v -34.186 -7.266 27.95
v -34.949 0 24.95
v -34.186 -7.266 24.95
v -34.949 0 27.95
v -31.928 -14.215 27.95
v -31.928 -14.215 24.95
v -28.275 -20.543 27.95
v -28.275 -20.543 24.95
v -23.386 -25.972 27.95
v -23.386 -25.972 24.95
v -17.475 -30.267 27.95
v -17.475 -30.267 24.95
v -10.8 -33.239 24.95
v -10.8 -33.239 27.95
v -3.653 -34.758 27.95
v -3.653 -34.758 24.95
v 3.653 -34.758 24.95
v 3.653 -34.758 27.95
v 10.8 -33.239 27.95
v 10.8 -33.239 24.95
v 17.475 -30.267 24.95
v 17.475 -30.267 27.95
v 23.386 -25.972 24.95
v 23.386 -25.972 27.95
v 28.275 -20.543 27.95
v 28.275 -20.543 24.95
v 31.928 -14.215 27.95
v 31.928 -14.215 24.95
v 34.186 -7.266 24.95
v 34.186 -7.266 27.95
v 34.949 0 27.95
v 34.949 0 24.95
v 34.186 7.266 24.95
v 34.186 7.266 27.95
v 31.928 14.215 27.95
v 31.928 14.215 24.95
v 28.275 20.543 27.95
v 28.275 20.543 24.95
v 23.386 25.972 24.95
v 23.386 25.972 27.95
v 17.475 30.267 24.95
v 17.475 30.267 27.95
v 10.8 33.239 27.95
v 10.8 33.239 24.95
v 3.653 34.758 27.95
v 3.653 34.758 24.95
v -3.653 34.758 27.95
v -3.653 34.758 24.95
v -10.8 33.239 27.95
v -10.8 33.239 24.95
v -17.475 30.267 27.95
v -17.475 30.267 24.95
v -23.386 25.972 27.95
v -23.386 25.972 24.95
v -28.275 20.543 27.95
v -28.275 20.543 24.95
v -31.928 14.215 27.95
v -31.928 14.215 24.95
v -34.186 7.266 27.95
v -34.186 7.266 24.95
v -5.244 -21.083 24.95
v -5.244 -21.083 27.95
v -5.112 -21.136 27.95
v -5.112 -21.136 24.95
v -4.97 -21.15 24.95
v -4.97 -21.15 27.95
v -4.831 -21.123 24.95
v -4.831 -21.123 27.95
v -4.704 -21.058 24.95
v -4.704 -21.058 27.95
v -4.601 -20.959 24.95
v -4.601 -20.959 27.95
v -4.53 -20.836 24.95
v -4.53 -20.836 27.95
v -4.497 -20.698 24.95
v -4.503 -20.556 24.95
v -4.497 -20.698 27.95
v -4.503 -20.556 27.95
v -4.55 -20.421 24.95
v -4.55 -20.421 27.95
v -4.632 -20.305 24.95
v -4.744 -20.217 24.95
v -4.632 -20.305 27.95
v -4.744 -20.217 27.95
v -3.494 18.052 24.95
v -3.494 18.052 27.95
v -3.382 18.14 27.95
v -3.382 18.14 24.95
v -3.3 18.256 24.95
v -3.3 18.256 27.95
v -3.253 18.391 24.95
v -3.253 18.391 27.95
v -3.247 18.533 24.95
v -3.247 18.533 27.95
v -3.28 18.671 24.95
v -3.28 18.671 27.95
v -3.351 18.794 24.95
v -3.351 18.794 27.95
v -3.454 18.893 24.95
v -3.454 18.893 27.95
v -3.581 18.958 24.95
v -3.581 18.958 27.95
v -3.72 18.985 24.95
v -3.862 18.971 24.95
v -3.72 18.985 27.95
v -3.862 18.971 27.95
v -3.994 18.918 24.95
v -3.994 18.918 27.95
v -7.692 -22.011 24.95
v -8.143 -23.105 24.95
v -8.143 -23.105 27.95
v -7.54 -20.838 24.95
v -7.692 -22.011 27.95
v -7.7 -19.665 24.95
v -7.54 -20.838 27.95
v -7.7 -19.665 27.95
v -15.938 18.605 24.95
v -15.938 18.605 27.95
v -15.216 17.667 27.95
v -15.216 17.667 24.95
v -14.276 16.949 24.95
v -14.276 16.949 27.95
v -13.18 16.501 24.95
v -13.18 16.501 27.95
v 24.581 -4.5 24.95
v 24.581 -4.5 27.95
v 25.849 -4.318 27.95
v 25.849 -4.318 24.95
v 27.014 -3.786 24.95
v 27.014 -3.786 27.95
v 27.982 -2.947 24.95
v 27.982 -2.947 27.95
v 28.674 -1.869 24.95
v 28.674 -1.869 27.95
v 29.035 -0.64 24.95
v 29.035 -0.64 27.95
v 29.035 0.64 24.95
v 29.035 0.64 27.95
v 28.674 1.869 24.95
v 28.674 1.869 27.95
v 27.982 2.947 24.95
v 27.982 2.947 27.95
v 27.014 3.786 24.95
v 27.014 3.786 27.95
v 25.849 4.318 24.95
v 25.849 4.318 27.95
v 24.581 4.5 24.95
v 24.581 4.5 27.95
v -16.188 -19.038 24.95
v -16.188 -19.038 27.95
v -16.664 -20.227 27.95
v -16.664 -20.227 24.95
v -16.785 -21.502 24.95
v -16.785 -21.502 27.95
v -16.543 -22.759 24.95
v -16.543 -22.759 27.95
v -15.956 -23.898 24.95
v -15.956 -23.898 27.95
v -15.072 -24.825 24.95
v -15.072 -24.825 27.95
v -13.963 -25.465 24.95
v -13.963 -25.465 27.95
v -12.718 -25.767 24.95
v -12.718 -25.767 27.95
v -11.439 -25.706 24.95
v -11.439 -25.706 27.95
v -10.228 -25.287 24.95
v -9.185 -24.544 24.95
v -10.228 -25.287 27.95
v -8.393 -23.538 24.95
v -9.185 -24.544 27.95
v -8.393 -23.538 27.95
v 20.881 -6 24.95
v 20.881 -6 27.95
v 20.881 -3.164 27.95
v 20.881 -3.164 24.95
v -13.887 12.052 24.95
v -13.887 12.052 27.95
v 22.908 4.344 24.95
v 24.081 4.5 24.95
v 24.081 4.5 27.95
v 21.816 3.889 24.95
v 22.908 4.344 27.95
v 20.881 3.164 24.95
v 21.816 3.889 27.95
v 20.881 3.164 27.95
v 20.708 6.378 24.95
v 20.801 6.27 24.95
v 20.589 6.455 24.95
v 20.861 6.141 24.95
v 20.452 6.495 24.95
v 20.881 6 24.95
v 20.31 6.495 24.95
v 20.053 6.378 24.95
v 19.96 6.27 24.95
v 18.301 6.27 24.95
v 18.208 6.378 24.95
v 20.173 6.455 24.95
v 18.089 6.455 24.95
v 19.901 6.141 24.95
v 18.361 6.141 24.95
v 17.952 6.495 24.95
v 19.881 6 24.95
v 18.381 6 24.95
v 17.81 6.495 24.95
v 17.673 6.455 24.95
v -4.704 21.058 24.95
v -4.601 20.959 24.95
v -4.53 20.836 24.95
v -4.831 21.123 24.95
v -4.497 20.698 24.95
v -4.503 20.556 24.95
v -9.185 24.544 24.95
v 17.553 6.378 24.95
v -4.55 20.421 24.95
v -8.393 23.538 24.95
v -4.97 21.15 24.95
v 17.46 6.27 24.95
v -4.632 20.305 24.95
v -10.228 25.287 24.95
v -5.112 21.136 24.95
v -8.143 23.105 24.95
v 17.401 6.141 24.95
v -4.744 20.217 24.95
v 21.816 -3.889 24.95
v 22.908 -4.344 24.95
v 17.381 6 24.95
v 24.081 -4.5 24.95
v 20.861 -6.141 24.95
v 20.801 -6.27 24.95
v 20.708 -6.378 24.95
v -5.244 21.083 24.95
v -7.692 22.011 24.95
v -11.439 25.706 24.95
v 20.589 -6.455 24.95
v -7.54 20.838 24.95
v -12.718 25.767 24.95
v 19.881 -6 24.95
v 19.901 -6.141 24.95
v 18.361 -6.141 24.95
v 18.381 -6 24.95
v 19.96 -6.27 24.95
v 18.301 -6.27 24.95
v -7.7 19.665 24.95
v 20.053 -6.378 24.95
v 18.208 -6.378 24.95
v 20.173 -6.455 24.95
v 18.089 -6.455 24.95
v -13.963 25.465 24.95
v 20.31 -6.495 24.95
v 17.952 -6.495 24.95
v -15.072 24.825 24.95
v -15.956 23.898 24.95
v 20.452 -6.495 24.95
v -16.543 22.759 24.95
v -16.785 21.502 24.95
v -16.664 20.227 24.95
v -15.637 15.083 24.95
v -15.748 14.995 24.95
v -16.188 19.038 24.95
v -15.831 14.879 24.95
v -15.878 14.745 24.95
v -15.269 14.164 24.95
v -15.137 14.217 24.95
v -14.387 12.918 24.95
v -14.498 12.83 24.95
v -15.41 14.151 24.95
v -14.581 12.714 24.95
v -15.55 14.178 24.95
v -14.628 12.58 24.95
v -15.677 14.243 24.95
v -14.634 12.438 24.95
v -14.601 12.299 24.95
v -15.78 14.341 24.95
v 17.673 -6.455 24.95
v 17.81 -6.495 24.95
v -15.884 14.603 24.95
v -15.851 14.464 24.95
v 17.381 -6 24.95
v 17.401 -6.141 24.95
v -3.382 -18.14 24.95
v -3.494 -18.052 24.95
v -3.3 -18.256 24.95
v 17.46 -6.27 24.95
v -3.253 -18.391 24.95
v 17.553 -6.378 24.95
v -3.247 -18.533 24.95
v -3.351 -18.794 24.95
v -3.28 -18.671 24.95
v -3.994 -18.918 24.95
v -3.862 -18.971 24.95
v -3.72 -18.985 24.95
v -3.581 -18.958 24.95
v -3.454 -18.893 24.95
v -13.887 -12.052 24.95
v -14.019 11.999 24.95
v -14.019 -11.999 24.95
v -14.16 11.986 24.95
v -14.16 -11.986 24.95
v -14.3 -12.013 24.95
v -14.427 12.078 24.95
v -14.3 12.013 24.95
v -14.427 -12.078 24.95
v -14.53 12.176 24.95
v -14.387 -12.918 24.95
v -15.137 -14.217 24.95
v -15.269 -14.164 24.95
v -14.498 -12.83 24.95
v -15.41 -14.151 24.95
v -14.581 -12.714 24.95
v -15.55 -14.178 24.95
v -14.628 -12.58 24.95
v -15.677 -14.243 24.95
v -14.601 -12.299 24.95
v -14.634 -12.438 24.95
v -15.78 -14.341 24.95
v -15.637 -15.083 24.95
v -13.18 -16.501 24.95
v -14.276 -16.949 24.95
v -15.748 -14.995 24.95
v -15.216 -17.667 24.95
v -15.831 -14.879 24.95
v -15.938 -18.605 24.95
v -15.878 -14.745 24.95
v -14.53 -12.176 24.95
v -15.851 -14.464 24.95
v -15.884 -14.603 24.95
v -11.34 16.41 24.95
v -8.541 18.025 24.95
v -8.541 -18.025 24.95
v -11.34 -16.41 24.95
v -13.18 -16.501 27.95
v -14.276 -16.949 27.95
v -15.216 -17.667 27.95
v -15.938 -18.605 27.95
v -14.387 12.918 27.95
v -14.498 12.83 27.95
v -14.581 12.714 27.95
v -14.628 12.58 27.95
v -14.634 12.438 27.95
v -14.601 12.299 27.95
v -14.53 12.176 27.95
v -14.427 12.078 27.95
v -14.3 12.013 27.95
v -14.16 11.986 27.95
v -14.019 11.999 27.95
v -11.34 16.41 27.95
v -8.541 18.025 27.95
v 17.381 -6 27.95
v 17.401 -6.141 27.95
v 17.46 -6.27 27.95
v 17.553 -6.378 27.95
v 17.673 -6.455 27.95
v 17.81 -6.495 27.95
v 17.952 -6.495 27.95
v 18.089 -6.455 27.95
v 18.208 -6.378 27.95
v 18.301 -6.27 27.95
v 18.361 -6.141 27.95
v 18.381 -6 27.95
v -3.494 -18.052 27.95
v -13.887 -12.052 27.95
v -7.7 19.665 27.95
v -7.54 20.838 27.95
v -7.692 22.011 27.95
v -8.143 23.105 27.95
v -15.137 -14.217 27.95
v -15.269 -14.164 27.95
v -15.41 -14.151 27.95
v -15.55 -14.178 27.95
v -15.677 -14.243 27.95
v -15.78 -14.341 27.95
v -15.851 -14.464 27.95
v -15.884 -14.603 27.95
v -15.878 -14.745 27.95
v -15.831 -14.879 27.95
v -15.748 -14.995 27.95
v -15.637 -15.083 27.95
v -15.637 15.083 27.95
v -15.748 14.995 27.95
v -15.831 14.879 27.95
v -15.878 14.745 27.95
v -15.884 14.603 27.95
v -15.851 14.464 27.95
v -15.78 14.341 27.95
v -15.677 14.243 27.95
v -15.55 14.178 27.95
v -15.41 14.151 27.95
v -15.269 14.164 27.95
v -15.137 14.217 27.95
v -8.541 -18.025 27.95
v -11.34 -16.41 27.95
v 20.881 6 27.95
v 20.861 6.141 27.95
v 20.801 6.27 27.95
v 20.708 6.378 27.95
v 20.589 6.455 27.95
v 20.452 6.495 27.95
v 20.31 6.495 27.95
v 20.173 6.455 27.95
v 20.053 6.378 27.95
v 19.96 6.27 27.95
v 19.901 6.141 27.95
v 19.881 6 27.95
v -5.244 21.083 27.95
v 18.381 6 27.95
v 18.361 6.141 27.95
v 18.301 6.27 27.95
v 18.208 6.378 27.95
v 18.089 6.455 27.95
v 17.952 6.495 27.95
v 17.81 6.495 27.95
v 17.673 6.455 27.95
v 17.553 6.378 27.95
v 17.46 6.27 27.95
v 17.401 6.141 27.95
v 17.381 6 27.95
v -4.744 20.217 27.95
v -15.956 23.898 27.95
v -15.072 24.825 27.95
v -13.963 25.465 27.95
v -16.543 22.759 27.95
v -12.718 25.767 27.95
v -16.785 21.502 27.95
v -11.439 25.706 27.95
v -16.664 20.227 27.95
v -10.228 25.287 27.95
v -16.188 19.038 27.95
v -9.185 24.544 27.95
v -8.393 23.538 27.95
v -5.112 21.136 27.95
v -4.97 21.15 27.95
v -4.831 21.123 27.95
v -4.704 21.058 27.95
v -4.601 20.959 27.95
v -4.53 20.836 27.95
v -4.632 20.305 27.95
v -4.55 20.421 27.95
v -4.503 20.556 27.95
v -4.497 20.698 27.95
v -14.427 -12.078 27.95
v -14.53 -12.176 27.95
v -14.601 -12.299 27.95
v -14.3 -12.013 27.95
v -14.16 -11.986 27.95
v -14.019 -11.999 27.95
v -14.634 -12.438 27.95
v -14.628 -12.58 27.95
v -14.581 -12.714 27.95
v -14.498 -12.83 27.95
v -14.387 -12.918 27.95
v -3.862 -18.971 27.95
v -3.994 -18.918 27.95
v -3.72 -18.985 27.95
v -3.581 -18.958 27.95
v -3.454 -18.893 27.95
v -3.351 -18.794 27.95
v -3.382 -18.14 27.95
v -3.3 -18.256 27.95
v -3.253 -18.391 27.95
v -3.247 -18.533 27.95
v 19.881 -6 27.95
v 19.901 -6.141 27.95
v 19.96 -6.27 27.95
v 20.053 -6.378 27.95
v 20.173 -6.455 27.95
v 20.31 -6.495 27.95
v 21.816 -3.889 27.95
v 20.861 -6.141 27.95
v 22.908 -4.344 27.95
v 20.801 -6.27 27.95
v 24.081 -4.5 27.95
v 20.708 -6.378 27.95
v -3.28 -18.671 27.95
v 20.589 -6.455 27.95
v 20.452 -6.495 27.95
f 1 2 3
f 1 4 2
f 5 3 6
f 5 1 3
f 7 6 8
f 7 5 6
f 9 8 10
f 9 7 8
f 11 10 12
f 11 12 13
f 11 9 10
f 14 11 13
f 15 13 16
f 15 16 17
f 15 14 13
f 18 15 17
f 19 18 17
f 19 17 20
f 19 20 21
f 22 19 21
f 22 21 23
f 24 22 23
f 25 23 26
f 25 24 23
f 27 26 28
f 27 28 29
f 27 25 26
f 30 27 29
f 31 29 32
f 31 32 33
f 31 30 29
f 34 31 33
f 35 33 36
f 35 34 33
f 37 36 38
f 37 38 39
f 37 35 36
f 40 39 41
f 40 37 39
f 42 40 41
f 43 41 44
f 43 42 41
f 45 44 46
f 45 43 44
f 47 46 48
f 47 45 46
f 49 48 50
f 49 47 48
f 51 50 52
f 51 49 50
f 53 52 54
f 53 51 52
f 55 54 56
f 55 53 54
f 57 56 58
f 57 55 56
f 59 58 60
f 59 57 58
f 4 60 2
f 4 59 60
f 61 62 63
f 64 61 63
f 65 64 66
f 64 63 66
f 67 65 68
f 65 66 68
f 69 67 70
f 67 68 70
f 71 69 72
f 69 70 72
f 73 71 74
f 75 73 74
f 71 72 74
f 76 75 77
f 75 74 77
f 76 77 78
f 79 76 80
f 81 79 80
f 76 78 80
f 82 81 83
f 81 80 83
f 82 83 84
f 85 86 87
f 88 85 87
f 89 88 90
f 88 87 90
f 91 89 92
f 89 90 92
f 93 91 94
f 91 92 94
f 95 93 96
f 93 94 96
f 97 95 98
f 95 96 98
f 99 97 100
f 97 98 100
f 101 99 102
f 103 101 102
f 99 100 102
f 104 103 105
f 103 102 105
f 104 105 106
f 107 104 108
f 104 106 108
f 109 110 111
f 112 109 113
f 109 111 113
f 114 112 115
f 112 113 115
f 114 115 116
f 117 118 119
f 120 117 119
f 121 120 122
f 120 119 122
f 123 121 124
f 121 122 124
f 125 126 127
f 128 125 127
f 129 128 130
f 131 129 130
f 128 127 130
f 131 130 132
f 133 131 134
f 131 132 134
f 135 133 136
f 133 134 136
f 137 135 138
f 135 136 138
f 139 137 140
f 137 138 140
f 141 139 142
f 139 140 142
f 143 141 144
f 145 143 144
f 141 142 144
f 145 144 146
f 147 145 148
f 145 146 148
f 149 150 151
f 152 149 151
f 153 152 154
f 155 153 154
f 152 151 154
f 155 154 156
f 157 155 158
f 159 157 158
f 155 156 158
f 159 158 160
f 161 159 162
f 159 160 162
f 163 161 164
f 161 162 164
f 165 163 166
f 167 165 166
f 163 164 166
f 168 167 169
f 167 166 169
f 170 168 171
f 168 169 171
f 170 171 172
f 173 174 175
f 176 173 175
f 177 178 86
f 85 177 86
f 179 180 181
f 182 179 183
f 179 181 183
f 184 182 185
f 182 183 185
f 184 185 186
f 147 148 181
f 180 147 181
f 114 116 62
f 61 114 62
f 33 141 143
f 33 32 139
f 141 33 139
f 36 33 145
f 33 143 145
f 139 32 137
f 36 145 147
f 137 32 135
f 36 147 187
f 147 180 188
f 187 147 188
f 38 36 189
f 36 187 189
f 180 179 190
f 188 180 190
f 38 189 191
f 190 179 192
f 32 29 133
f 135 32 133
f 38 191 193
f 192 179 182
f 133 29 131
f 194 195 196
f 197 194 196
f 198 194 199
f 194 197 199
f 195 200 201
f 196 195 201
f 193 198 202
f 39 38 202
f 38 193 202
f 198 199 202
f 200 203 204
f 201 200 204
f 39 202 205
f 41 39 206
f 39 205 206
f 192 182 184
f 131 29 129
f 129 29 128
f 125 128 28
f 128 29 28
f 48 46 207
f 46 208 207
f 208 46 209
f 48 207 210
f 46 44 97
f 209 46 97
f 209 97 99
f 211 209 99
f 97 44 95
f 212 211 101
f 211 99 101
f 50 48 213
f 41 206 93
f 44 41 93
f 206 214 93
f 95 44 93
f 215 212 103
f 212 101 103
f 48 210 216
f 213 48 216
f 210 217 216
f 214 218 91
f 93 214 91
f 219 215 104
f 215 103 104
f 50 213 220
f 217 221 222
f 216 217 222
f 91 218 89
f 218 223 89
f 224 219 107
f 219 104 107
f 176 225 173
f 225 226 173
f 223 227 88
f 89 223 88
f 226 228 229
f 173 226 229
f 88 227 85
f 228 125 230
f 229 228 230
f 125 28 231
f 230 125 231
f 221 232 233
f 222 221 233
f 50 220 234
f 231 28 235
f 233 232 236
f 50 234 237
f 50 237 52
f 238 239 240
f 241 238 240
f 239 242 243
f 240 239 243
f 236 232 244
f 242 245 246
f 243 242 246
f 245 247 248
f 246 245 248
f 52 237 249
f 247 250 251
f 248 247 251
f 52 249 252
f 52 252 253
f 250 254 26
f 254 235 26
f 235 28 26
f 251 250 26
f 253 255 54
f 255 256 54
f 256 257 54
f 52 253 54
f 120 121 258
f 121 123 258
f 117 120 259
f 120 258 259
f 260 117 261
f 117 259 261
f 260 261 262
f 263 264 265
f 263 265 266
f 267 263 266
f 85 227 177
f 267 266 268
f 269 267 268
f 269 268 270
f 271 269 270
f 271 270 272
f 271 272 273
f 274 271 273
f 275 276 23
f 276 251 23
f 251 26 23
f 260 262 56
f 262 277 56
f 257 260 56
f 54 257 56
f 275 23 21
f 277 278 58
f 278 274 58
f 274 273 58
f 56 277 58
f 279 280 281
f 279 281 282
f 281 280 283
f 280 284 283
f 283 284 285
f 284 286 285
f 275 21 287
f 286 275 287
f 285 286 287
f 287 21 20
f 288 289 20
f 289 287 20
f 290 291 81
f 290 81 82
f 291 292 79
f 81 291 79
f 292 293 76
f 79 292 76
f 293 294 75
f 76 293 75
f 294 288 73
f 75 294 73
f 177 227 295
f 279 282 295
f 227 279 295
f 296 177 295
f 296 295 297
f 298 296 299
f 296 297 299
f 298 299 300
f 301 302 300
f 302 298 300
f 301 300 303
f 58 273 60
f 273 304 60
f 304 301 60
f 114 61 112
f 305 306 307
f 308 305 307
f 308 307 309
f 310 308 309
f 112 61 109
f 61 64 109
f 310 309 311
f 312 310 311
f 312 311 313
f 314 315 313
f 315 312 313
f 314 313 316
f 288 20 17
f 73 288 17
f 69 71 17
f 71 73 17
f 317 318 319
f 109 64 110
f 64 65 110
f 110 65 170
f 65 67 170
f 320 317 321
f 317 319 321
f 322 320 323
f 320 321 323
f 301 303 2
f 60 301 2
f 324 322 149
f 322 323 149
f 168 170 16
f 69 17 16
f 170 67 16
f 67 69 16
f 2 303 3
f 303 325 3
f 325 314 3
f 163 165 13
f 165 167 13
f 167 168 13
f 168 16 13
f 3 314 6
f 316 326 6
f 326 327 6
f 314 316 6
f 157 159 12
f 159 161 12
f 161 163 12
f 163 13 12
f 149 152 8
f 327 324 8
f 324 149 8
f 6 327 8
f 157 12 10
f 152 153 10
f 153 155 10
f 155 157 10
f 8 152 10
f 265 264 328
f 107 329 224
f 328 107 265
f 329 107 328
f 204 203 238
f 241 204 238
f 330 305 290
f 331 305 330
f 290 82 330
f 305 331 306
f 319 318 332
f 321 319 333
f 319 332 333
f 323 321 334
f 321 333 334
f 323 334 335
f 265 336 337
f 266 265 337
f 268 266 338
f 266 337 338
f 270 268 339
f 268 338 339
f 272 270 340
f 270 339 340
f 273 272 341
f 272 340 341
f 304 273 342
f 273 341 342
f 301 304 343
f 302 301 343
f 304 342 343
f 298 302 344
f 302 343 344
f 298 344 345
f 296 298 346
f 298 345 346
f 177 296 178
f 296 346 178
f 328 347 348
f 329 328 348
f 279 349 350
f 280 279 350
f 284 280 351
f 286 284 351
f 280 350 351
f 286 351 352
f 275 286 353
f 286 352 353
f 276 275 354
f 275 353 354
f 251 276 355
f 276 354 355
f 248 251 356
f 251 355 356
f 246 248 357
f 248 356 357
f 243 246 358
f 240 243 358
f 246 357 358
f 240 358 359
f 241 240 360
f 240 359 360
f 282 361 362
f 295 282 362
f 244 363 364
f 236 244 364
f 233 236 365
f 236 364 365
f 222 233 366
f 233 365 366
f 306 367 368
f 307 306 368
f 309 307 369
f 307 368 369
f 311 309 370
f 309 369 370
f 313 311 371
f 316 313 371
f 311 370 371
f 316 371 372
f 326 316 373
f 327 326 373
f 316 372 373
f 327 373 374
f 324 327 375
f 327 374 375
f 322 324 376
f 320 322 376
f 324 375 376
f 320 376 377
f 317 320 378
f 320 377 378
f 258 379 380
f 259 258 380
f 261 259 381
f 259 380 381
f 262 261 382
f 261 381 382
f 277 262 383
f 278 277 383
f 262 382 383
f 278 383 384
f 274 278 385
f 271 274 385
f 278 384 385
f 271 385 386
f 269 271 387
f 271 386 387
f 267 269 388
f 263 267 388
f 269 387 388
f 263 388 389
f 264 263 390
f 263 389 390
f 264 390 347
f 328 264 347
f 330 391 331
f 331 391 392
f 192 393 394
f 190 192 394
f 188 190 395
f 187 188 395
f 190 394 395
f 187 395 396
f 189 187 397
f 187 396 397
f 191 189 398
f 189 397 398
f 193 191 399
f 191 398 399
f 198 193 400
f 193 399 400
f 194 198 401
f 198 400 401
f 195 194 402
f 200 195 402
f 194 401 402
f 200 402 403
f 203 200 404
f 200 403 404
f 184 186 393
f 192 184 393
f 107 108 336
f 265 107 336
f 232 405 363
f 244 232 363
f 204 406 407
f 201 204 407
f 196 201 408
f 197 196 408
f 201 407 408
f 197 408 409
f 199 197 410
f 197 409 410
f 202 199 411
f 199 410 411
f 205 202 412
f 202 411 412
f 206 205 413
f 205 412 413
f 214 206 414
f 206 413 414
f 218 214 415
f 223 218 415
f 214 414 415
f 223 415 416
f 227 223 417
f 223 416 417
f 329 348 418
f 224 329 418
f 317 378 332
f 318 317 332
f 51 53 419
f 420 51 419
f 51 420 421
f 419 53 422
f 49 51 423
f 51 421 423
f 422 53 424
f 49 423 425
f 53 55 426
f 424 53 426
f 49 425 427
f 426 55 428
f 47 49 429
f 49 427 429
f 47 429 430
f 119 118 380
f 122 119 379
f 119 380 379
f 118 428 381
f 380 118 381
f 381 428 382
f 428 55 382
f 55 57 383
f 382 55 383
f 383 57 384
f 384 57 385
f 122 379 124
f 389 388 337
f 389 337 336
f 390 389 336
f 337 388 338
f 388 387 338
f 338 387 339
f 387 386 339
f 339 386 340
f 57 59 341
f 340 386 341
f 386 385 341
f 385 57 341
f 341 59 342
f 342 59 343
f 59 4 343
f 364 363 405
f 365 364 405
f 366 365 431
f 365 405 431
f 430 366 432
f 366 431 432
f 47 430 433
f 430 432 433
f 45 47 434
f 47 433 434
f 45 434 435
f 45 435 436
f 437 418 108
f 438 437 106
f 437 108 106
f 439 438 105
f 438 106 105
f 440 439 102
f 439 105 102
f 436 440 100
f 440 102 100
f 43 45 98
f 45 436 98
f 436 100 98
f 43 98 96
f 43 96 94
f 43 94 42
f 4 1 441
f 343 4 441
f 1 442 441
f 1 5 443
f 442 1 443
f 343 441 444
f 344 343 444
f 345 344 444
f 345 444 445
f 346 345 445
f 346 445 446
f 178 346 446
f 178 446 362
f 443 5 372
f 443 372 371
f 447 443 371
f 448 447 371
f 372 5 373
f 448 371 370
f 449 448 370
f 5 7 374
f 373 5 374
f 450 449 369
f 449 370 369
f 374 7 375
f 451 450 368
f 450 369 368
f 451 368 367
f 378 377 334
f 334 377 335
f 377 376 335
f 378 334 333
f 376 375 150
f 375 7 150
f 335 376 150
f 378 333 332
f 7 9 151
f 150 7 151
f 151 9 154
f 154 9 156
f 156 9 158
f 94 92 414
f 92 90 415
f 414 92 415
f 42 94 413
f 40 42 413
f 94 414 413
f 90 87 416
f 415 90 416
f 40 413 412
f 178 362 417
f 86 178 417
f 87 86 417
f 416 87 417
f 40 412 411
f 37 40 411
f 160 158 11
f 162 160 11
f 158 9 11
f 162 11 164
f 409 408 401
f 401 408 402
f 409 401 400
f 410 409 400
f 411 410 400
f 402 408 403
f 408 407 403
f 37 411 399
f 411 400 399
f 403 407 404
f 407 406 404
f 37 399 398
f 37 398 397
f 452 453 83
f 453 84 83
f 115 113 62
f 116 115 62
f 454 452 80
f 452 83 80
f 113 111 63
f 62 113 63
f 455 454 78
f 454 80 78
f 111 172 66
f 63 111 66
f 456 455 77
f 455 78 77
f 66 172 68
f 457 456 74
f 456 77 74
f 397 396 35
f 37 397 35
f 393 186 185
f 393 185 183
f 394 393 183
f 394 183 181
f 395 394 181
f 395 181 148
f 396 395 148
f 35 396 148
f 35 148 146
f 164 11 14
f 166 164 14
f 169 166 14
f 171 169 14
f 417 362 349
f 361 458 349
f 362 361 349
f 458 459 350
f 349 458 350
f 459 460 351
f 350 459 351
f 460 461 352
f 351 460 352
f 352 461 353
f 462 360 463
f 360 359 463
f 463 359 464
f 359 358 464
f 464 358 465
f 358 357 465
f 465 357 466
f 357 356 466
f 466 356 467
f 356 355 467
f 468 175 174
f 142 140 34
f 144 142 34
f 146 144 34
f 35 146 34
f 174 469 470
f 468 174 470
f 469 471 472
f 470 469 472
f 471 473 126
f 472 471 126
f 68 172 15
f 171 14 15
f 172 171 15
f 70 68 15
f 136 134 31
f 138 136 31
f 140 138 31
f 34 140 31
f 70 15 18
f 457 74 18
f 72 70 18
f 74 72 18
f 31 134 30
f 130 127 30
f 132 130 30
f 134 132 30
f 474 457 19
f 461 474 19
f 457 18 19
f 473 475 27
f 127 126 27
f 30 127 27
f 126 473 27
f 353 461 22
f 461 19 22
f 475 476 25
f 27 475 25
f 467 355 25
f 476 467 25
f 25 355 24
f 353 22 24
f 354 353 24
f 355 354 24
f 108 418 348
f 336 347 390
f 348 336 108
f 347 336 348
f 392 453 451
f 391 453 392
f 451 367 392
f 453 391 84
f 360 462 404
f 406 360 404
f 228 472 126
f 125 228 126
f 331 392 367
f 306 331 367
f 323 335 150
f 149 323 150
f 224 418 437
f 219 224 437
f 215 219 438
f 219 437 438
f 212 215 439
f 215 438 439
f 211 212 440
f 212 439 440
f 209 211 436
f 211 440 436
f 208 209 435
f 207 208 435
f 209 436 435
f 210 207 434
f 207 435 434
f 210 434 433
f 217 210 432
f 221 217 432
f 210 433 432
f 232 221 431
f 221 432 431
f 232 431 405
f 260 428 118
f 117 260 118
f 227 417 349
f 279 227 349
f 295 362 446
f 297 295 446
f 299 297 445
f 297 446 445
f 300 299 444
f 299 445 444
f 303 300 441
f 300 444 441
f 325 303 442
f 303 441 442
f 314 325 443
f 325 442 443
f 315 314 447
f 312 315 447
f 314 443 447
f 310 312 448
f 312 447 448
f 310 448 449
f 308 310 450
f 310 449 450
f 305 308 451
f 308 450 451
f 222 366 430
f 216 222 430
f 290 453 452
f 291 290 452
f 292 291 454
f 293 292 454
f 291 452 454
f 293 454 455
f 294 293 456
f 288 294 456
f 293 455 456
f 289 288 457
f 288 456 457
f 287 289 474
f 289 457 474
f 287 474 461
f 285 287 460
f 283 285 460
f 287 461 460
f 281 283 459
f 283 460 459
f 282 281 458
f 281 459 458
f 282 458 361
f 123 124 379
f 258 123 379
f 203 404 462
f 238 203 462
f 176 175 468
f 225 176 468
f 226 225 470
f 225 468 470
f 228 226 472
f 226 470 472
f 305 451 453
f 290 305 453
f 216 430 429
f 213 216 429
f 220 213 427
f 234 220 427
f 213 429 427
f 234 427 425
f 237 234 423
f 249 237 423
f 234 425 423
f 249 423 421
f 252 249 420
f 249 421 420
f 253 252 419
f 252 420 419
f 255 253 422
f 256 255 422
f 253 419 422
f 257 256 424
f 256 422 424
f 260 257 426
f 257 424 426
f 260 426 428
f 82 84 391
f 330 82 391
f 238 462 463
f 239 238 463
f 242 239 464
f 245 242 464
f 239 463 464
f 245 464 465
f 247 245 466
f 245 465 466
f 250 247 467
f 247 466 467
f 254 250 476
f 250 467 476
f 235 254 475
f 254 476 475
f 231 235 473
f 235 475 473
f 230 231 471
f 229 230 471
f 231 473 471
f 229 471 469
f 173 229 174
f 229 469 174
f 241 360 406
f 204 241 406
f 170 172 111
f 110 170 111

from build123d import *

# Parameters (mm, degrees)
SKETCH015_W     = 34.949282
SKETCH015_H     = 3
POCKET002_DEPTH = 3.001
PAD003_DEPTH    = 3
POCKET003_DEPTH = 3.001


with BuildPart() as part:
    # Sketch015 → Revolution004 (revolve)
    with BuildSketch(Plane.XZ):
        with Locations((-17.474641, 46.45)):
            Rectangle(SKETCH015_W, SKETCH015_H)
    revolve(axis=Axis((0, 0, 0), (0, 0, 1)))

    # Sketch024 (on Face1 of Revolution004) → Pocket002 (cut, through all)
    with BuildSketch(Plane(origin=(0, 0, 47.95), x_dir=(-1, 0, 0), z_dir=(0, 0, 1))):
        with BuildLine():
            ThreePointArc((-24.580824, 4.5), (-29.080824, 0), (-24.580824, -4.5))
            Line((-24.580824, -4.5), (-24.080824, -4.5))
            ThreePointArc((-24.080824, -4.5), (-19.580824, 0), (-24.080824, 4.5))
            Line((-24.080824, 4.5), (-24.580824, 4.5))
        make_face()
        with BuildLine():
            ThreePointArc((15.937526, -18.604605), (9.790412, -16.957491), (8.143298, -23.104605))
            Line((8.143298, -23.104605), (8.393298, -23.537618))
            ThreePointArc((8.393298, -23.537618), (14.540412, -25.184732), (16.187526, -19.037618))
            Line((16.187526, -19.037618), (15.937526, -18.604605))
        make_face()
        with BuildLine():
            ThreePointArc((8.143298, 23.104605), (9.790412, 16.957491), (15.937526, 18.604605))
            Line((15.937526, 18.604605), (16.187526, 19.037618))
            ThreePointArc((16.187526, 19.037618), (14.540412, 25.184732), (8.393298, 23.537618))
            Line((8.393298, 23.537618), (8.143298, 23.104605))
        make_face()
    extrude(amount=-POCKET002_DEPTH, mode=Mode.SUBTRACT)

    # Sketch025 (on Face1 of Pocket002) → Pad003 (join)
    with BuildSketch(Plane(origin=(0, 0, 47.95), x_dir=(-1, 0, 0), z_dir=(0, 0, 1))):
        Polygon((-19.880824, 1.615549), (8.541305, 18.025073), (11.339519, 16.409524), (11.339519, -16.409524), (8.541305, -18.025073), (-19.880824, -1.615549), align=None)
    extrude(amount=-PAD003_DEPTH)

    # Sketch026 (on Face2 of Pad003) → Pocket003 (cut, through all)
    with BuildSketch(Plane(origin=(0, 0, 47.95), x_dir=(-1, 0, 0), z_dir=(0, 0, 1))):
        with BuildLine():
            ThreePointArc((-19.880824, 6), (-20.380824, 6.5), (-20.880824, 6))
            Line((-20.880824, 6), (-20.880824, -6))
            ThreePointArc((-20.880824, -6), (-20.380824, -6.5), (-19.880824, -6))
            Line((-19.880824, -6), (-19.880824, 6))
        make_face()
        with BuildLine():
            ThreePointArc((15.636564, -15.083324), (15.819577, -14.400311), (15.136564, -14.217299))
            Line((15.136564, -14.217299), (4.74426, -20.217299))
            ThreePointArc((4.74426, -20.217299), (4.561247, -20.900311), (5.24426, -21.083324))
            Line((5.24426, -21.083324), (15.636564, -15.083324))
        make_face()
        with BuildLine():
            ThreePointArc((5.24426, 21.083324), (4.561247, 20.900311), (4.74426, 20.217299))
            Line((4.74426, 20.217299), (15.136564, 14.217299))
            ThreePointArc((15.136564, 14.217299), (15.819577, 14.400311), (15.636564, 15.083324))
            Line((15.636564, 15.083324), (5.24426, 21.083324))
        make_face()
        with BuildLine():
            ThreePointArc((-17.380824, 6), (-17.880824, 6.5), (-18.380824, 6))
            Line((-18.380824, 6), (-18.380824, -6))
            ThreePointArc((-18.380824, -6), (-17.880824, -6.5), (-17.380824, -6))
            Line((-17.380824, -6), (-17.380824, 6))
        make_face()
        with BuildLine():
            ThreePointArc((3.99426, 18.918261), (3.311247, 18.735248), (3.49426, 18.052235))
            Line((3.49426, 18.052235), (13.886564, 12.052235))
            ThreePointArc((13.886564, 12.052235), (14.569577, 12.235248), (14.386564, 12.918261))
            Line((14.386564, 12.918261), (3.99426, 18.918261))
        make_face()
        with BuildLine():
            ThreePointArc((14.386564, -12.918261), (14.569577, -12.235248), (13.886564, -12.052235))
            Line((13.886564, -12.052235), (3.49426, -18.052235))
            ThreePointArc((3.49426, -18.052235), (3.311247, -18.735248), (3.99426, -18.918261))
            Line((3.99426, -18.918261), (14.386564, -12.918261))
        make_face()
    extrude(amount=-POCKET003_DEPTH, mode=Mode.SUBTRACT)


with BuildPart() as part_1:
    # Body005 placement: moved
    add(part.part.moved(Location((0, 0, -20))))


solid = part_1.part
